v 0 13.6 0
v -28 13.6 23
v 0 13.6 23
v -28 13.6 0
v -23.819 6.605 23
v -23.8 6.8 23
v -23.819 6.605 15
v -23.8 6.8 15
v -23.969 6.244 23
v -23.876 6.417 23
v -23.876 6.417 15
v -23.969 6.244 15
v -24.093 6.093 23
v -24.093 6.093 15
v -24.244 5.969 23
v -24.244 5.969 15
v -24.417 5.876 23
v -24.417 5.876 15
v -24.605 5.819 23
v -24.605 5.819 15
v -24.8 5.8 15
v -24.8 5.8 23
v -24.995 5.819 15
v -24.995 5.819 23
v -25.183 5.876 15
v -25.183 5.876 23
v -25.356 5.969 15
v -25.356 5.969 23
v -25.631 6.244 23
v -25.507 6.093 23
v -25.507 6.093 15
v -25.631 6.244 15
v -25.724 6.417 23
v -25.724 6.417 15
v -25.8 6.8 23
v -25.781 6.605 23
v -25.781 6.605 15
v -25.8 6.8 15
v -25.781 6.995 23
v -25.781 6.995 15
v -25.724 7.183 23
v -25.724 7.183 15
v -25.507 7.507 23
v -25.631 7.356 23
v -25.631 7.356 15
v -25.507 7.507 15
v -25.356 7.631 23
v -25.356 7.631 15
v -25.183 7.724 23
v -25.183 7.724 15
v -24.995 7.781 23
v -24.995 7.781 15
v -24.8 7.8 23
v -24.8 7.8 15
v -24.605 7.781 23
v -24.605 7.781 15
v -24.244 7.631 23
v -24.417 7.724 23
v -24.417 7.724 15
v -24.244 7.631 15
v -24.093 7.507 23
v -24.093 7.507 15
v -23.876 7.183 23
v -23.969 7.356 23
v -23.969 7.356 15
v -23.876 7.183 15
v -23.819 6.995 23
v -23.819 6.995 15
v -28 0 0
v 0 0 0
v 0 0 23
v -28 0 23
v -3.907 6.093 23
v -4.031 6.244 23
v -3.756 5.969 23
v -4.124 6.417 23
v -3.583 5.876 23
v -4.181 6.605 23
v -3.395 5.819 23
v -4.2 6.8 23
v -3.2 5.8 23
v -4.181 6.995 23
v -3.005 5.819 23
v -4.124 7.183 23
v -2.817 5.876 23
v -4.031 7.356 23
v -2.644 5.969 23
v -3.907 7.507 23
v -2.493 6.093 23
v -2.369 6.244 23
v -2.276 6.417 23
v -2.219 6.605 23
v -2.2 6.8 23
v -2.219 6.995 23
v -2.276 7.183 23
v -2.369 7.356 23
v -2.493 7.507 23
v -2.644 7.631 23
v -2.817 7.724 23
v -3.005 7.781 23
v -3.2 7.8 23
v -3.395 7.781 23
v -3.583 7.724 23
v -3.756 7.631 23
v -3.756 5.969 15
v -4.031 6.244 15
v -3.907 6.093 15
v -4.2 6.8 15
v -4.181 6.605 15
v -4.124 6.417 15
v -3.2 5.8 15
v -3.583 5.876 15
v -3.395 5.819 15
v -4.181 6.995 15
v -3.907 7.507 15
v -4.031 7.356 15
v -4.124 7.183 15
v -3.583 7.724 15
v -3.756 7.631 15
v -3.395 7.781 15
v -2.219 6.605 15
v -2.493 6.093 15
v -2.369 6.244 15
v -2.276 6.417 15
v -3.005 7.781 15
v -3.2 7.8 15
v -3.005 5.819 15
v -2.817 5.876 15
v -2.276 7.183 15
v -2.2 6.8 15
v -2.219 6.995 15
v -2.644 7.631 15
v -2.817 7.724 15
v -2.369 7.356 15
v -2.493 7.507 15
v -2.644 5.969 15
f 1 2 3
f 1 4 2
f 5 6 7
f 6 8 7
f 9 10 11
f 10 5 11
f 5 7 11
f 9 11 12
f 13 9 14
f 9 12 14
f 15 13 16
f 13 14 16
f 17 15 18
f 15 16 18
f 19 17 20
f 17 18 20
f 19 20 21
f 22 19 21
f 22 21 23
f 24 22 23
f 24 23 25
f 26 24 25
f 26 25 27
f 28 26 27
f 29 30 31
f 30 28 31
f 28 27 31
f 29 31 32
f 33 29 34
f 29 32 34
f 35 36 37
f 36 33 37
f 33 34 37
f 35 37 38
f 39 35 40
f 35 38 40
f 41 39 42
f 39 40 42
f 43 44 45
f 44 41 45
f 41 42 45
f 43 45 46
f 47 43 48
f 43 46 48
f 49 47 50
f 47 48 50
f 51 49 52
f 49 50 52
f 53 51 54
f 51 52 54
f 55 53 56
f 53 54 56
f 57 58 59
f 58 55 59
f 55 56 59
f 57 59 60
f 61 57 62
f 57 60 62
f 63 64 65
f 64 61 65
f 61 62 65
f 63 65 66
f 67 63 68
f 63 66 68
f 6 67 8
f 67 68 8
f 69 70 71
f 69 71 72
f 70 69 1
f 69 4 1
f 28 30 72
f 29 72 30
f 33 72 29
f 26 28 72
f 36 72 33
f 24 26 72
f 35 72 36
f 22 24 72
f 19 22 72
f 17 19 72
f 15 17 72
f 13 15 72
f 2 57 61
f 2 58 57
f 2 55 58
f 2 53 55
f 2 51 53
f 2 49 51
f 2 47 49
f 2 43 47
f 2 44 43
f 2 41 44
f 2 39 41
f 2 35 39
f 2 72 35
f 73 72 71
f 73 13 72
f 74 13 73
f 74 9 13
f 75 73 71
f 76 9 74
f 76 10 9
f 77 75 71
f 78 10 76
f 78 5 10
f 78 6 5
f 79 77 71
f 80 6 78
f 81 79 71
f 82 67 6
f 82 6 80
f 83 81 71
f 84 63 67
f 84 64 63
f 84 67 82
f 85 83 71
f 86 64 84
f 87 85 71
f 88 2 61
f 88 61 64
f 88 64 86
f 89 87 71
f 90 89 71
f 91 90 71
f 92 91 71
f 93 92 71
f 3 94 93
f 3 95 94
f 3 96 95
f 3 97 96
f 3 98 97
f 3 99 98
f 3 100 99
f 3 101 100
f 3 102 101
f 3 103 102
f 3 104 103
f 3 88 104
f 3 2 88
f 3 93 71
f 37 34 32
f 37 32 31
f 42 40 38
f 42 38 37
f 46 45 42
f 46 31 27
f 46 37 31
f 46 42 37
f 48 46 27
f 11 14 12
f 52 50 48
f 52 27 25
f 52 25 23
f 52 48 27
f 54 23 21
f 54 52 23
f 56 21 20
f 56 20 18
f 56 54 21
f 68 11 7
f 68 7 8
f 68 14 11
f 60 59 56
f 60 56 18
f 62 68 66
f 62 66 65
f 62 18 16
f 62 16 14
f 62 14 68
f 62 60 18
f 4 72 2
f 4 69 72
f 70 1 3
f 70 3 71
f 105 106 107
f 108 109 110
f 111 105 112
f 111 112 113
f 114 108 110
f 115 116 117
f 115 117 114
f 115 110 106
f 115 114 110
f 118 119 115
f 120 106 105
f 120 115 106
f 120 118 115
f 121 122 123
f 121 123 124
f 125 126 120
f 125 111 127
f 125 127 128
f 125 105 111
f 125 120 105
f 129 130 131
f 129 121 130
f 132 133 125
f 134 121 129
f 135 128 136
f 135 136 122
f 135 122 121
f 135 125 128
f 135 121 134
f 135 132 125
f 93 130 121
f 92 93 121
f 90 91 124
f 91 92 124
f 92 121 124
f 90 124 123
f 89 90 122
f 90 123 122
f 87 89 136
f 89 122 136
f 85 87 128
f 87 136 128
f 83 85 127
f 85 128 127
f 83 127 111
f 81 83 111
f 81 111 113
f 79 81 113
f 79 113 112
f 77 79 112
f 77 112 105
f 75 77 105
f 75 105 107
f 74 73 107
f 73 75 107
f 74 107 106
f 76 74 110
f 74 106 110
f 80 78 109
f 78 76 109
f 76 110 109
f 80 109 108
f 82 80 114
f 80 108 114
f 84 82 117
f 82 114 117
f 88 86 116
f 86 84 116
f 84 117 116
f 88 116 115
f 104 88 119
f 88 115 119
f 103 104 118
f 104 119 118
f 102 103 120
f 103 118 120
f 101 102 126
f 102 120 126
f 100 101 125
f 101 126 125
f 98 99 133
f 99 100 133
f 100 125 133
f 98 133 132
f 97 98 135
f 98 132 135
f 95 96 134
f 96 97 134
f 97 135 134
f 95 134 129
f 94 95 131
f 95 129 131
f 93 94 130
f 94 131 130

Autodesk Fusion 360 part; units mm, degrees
sketch "Skizze1" plane through (0, 0, 0) normal (0, 0, 1) x (1, 0, 0)
  line L0 (0, 0) -> (-28, 0)
  line L1 (-28, 0) -> (-28, 13.6)
  line L2 (-28, 13.6) -> (0, 13.6)
  line L3 (0, 13.6) -> (0, 0)
  line L4 (-28, 6.8) -> (0, 6.8) construction
  circle A0 centre (-24.8, 6.8) radius 1
  circle A1 centre (-3.2, 6.8) radius 1
  line L5 (-14, 13.6) -> (-14, 0) construction
  dimension "d1" = 13.6
  dimension "d2" = 28
  dimension "d5" = 2
  dimension "d6" = 2
  dimension "d7" = 21.6
extrude "Extrusion1" add sketch "Skizze1" along normal blind 23 contours L0 L1 L2 L3 | A0 | A1
extrude "Extrusion2" cut sketch "Skizze1" along normal up to surface (8 mm away) from surface at 15 contours A0 | A1
